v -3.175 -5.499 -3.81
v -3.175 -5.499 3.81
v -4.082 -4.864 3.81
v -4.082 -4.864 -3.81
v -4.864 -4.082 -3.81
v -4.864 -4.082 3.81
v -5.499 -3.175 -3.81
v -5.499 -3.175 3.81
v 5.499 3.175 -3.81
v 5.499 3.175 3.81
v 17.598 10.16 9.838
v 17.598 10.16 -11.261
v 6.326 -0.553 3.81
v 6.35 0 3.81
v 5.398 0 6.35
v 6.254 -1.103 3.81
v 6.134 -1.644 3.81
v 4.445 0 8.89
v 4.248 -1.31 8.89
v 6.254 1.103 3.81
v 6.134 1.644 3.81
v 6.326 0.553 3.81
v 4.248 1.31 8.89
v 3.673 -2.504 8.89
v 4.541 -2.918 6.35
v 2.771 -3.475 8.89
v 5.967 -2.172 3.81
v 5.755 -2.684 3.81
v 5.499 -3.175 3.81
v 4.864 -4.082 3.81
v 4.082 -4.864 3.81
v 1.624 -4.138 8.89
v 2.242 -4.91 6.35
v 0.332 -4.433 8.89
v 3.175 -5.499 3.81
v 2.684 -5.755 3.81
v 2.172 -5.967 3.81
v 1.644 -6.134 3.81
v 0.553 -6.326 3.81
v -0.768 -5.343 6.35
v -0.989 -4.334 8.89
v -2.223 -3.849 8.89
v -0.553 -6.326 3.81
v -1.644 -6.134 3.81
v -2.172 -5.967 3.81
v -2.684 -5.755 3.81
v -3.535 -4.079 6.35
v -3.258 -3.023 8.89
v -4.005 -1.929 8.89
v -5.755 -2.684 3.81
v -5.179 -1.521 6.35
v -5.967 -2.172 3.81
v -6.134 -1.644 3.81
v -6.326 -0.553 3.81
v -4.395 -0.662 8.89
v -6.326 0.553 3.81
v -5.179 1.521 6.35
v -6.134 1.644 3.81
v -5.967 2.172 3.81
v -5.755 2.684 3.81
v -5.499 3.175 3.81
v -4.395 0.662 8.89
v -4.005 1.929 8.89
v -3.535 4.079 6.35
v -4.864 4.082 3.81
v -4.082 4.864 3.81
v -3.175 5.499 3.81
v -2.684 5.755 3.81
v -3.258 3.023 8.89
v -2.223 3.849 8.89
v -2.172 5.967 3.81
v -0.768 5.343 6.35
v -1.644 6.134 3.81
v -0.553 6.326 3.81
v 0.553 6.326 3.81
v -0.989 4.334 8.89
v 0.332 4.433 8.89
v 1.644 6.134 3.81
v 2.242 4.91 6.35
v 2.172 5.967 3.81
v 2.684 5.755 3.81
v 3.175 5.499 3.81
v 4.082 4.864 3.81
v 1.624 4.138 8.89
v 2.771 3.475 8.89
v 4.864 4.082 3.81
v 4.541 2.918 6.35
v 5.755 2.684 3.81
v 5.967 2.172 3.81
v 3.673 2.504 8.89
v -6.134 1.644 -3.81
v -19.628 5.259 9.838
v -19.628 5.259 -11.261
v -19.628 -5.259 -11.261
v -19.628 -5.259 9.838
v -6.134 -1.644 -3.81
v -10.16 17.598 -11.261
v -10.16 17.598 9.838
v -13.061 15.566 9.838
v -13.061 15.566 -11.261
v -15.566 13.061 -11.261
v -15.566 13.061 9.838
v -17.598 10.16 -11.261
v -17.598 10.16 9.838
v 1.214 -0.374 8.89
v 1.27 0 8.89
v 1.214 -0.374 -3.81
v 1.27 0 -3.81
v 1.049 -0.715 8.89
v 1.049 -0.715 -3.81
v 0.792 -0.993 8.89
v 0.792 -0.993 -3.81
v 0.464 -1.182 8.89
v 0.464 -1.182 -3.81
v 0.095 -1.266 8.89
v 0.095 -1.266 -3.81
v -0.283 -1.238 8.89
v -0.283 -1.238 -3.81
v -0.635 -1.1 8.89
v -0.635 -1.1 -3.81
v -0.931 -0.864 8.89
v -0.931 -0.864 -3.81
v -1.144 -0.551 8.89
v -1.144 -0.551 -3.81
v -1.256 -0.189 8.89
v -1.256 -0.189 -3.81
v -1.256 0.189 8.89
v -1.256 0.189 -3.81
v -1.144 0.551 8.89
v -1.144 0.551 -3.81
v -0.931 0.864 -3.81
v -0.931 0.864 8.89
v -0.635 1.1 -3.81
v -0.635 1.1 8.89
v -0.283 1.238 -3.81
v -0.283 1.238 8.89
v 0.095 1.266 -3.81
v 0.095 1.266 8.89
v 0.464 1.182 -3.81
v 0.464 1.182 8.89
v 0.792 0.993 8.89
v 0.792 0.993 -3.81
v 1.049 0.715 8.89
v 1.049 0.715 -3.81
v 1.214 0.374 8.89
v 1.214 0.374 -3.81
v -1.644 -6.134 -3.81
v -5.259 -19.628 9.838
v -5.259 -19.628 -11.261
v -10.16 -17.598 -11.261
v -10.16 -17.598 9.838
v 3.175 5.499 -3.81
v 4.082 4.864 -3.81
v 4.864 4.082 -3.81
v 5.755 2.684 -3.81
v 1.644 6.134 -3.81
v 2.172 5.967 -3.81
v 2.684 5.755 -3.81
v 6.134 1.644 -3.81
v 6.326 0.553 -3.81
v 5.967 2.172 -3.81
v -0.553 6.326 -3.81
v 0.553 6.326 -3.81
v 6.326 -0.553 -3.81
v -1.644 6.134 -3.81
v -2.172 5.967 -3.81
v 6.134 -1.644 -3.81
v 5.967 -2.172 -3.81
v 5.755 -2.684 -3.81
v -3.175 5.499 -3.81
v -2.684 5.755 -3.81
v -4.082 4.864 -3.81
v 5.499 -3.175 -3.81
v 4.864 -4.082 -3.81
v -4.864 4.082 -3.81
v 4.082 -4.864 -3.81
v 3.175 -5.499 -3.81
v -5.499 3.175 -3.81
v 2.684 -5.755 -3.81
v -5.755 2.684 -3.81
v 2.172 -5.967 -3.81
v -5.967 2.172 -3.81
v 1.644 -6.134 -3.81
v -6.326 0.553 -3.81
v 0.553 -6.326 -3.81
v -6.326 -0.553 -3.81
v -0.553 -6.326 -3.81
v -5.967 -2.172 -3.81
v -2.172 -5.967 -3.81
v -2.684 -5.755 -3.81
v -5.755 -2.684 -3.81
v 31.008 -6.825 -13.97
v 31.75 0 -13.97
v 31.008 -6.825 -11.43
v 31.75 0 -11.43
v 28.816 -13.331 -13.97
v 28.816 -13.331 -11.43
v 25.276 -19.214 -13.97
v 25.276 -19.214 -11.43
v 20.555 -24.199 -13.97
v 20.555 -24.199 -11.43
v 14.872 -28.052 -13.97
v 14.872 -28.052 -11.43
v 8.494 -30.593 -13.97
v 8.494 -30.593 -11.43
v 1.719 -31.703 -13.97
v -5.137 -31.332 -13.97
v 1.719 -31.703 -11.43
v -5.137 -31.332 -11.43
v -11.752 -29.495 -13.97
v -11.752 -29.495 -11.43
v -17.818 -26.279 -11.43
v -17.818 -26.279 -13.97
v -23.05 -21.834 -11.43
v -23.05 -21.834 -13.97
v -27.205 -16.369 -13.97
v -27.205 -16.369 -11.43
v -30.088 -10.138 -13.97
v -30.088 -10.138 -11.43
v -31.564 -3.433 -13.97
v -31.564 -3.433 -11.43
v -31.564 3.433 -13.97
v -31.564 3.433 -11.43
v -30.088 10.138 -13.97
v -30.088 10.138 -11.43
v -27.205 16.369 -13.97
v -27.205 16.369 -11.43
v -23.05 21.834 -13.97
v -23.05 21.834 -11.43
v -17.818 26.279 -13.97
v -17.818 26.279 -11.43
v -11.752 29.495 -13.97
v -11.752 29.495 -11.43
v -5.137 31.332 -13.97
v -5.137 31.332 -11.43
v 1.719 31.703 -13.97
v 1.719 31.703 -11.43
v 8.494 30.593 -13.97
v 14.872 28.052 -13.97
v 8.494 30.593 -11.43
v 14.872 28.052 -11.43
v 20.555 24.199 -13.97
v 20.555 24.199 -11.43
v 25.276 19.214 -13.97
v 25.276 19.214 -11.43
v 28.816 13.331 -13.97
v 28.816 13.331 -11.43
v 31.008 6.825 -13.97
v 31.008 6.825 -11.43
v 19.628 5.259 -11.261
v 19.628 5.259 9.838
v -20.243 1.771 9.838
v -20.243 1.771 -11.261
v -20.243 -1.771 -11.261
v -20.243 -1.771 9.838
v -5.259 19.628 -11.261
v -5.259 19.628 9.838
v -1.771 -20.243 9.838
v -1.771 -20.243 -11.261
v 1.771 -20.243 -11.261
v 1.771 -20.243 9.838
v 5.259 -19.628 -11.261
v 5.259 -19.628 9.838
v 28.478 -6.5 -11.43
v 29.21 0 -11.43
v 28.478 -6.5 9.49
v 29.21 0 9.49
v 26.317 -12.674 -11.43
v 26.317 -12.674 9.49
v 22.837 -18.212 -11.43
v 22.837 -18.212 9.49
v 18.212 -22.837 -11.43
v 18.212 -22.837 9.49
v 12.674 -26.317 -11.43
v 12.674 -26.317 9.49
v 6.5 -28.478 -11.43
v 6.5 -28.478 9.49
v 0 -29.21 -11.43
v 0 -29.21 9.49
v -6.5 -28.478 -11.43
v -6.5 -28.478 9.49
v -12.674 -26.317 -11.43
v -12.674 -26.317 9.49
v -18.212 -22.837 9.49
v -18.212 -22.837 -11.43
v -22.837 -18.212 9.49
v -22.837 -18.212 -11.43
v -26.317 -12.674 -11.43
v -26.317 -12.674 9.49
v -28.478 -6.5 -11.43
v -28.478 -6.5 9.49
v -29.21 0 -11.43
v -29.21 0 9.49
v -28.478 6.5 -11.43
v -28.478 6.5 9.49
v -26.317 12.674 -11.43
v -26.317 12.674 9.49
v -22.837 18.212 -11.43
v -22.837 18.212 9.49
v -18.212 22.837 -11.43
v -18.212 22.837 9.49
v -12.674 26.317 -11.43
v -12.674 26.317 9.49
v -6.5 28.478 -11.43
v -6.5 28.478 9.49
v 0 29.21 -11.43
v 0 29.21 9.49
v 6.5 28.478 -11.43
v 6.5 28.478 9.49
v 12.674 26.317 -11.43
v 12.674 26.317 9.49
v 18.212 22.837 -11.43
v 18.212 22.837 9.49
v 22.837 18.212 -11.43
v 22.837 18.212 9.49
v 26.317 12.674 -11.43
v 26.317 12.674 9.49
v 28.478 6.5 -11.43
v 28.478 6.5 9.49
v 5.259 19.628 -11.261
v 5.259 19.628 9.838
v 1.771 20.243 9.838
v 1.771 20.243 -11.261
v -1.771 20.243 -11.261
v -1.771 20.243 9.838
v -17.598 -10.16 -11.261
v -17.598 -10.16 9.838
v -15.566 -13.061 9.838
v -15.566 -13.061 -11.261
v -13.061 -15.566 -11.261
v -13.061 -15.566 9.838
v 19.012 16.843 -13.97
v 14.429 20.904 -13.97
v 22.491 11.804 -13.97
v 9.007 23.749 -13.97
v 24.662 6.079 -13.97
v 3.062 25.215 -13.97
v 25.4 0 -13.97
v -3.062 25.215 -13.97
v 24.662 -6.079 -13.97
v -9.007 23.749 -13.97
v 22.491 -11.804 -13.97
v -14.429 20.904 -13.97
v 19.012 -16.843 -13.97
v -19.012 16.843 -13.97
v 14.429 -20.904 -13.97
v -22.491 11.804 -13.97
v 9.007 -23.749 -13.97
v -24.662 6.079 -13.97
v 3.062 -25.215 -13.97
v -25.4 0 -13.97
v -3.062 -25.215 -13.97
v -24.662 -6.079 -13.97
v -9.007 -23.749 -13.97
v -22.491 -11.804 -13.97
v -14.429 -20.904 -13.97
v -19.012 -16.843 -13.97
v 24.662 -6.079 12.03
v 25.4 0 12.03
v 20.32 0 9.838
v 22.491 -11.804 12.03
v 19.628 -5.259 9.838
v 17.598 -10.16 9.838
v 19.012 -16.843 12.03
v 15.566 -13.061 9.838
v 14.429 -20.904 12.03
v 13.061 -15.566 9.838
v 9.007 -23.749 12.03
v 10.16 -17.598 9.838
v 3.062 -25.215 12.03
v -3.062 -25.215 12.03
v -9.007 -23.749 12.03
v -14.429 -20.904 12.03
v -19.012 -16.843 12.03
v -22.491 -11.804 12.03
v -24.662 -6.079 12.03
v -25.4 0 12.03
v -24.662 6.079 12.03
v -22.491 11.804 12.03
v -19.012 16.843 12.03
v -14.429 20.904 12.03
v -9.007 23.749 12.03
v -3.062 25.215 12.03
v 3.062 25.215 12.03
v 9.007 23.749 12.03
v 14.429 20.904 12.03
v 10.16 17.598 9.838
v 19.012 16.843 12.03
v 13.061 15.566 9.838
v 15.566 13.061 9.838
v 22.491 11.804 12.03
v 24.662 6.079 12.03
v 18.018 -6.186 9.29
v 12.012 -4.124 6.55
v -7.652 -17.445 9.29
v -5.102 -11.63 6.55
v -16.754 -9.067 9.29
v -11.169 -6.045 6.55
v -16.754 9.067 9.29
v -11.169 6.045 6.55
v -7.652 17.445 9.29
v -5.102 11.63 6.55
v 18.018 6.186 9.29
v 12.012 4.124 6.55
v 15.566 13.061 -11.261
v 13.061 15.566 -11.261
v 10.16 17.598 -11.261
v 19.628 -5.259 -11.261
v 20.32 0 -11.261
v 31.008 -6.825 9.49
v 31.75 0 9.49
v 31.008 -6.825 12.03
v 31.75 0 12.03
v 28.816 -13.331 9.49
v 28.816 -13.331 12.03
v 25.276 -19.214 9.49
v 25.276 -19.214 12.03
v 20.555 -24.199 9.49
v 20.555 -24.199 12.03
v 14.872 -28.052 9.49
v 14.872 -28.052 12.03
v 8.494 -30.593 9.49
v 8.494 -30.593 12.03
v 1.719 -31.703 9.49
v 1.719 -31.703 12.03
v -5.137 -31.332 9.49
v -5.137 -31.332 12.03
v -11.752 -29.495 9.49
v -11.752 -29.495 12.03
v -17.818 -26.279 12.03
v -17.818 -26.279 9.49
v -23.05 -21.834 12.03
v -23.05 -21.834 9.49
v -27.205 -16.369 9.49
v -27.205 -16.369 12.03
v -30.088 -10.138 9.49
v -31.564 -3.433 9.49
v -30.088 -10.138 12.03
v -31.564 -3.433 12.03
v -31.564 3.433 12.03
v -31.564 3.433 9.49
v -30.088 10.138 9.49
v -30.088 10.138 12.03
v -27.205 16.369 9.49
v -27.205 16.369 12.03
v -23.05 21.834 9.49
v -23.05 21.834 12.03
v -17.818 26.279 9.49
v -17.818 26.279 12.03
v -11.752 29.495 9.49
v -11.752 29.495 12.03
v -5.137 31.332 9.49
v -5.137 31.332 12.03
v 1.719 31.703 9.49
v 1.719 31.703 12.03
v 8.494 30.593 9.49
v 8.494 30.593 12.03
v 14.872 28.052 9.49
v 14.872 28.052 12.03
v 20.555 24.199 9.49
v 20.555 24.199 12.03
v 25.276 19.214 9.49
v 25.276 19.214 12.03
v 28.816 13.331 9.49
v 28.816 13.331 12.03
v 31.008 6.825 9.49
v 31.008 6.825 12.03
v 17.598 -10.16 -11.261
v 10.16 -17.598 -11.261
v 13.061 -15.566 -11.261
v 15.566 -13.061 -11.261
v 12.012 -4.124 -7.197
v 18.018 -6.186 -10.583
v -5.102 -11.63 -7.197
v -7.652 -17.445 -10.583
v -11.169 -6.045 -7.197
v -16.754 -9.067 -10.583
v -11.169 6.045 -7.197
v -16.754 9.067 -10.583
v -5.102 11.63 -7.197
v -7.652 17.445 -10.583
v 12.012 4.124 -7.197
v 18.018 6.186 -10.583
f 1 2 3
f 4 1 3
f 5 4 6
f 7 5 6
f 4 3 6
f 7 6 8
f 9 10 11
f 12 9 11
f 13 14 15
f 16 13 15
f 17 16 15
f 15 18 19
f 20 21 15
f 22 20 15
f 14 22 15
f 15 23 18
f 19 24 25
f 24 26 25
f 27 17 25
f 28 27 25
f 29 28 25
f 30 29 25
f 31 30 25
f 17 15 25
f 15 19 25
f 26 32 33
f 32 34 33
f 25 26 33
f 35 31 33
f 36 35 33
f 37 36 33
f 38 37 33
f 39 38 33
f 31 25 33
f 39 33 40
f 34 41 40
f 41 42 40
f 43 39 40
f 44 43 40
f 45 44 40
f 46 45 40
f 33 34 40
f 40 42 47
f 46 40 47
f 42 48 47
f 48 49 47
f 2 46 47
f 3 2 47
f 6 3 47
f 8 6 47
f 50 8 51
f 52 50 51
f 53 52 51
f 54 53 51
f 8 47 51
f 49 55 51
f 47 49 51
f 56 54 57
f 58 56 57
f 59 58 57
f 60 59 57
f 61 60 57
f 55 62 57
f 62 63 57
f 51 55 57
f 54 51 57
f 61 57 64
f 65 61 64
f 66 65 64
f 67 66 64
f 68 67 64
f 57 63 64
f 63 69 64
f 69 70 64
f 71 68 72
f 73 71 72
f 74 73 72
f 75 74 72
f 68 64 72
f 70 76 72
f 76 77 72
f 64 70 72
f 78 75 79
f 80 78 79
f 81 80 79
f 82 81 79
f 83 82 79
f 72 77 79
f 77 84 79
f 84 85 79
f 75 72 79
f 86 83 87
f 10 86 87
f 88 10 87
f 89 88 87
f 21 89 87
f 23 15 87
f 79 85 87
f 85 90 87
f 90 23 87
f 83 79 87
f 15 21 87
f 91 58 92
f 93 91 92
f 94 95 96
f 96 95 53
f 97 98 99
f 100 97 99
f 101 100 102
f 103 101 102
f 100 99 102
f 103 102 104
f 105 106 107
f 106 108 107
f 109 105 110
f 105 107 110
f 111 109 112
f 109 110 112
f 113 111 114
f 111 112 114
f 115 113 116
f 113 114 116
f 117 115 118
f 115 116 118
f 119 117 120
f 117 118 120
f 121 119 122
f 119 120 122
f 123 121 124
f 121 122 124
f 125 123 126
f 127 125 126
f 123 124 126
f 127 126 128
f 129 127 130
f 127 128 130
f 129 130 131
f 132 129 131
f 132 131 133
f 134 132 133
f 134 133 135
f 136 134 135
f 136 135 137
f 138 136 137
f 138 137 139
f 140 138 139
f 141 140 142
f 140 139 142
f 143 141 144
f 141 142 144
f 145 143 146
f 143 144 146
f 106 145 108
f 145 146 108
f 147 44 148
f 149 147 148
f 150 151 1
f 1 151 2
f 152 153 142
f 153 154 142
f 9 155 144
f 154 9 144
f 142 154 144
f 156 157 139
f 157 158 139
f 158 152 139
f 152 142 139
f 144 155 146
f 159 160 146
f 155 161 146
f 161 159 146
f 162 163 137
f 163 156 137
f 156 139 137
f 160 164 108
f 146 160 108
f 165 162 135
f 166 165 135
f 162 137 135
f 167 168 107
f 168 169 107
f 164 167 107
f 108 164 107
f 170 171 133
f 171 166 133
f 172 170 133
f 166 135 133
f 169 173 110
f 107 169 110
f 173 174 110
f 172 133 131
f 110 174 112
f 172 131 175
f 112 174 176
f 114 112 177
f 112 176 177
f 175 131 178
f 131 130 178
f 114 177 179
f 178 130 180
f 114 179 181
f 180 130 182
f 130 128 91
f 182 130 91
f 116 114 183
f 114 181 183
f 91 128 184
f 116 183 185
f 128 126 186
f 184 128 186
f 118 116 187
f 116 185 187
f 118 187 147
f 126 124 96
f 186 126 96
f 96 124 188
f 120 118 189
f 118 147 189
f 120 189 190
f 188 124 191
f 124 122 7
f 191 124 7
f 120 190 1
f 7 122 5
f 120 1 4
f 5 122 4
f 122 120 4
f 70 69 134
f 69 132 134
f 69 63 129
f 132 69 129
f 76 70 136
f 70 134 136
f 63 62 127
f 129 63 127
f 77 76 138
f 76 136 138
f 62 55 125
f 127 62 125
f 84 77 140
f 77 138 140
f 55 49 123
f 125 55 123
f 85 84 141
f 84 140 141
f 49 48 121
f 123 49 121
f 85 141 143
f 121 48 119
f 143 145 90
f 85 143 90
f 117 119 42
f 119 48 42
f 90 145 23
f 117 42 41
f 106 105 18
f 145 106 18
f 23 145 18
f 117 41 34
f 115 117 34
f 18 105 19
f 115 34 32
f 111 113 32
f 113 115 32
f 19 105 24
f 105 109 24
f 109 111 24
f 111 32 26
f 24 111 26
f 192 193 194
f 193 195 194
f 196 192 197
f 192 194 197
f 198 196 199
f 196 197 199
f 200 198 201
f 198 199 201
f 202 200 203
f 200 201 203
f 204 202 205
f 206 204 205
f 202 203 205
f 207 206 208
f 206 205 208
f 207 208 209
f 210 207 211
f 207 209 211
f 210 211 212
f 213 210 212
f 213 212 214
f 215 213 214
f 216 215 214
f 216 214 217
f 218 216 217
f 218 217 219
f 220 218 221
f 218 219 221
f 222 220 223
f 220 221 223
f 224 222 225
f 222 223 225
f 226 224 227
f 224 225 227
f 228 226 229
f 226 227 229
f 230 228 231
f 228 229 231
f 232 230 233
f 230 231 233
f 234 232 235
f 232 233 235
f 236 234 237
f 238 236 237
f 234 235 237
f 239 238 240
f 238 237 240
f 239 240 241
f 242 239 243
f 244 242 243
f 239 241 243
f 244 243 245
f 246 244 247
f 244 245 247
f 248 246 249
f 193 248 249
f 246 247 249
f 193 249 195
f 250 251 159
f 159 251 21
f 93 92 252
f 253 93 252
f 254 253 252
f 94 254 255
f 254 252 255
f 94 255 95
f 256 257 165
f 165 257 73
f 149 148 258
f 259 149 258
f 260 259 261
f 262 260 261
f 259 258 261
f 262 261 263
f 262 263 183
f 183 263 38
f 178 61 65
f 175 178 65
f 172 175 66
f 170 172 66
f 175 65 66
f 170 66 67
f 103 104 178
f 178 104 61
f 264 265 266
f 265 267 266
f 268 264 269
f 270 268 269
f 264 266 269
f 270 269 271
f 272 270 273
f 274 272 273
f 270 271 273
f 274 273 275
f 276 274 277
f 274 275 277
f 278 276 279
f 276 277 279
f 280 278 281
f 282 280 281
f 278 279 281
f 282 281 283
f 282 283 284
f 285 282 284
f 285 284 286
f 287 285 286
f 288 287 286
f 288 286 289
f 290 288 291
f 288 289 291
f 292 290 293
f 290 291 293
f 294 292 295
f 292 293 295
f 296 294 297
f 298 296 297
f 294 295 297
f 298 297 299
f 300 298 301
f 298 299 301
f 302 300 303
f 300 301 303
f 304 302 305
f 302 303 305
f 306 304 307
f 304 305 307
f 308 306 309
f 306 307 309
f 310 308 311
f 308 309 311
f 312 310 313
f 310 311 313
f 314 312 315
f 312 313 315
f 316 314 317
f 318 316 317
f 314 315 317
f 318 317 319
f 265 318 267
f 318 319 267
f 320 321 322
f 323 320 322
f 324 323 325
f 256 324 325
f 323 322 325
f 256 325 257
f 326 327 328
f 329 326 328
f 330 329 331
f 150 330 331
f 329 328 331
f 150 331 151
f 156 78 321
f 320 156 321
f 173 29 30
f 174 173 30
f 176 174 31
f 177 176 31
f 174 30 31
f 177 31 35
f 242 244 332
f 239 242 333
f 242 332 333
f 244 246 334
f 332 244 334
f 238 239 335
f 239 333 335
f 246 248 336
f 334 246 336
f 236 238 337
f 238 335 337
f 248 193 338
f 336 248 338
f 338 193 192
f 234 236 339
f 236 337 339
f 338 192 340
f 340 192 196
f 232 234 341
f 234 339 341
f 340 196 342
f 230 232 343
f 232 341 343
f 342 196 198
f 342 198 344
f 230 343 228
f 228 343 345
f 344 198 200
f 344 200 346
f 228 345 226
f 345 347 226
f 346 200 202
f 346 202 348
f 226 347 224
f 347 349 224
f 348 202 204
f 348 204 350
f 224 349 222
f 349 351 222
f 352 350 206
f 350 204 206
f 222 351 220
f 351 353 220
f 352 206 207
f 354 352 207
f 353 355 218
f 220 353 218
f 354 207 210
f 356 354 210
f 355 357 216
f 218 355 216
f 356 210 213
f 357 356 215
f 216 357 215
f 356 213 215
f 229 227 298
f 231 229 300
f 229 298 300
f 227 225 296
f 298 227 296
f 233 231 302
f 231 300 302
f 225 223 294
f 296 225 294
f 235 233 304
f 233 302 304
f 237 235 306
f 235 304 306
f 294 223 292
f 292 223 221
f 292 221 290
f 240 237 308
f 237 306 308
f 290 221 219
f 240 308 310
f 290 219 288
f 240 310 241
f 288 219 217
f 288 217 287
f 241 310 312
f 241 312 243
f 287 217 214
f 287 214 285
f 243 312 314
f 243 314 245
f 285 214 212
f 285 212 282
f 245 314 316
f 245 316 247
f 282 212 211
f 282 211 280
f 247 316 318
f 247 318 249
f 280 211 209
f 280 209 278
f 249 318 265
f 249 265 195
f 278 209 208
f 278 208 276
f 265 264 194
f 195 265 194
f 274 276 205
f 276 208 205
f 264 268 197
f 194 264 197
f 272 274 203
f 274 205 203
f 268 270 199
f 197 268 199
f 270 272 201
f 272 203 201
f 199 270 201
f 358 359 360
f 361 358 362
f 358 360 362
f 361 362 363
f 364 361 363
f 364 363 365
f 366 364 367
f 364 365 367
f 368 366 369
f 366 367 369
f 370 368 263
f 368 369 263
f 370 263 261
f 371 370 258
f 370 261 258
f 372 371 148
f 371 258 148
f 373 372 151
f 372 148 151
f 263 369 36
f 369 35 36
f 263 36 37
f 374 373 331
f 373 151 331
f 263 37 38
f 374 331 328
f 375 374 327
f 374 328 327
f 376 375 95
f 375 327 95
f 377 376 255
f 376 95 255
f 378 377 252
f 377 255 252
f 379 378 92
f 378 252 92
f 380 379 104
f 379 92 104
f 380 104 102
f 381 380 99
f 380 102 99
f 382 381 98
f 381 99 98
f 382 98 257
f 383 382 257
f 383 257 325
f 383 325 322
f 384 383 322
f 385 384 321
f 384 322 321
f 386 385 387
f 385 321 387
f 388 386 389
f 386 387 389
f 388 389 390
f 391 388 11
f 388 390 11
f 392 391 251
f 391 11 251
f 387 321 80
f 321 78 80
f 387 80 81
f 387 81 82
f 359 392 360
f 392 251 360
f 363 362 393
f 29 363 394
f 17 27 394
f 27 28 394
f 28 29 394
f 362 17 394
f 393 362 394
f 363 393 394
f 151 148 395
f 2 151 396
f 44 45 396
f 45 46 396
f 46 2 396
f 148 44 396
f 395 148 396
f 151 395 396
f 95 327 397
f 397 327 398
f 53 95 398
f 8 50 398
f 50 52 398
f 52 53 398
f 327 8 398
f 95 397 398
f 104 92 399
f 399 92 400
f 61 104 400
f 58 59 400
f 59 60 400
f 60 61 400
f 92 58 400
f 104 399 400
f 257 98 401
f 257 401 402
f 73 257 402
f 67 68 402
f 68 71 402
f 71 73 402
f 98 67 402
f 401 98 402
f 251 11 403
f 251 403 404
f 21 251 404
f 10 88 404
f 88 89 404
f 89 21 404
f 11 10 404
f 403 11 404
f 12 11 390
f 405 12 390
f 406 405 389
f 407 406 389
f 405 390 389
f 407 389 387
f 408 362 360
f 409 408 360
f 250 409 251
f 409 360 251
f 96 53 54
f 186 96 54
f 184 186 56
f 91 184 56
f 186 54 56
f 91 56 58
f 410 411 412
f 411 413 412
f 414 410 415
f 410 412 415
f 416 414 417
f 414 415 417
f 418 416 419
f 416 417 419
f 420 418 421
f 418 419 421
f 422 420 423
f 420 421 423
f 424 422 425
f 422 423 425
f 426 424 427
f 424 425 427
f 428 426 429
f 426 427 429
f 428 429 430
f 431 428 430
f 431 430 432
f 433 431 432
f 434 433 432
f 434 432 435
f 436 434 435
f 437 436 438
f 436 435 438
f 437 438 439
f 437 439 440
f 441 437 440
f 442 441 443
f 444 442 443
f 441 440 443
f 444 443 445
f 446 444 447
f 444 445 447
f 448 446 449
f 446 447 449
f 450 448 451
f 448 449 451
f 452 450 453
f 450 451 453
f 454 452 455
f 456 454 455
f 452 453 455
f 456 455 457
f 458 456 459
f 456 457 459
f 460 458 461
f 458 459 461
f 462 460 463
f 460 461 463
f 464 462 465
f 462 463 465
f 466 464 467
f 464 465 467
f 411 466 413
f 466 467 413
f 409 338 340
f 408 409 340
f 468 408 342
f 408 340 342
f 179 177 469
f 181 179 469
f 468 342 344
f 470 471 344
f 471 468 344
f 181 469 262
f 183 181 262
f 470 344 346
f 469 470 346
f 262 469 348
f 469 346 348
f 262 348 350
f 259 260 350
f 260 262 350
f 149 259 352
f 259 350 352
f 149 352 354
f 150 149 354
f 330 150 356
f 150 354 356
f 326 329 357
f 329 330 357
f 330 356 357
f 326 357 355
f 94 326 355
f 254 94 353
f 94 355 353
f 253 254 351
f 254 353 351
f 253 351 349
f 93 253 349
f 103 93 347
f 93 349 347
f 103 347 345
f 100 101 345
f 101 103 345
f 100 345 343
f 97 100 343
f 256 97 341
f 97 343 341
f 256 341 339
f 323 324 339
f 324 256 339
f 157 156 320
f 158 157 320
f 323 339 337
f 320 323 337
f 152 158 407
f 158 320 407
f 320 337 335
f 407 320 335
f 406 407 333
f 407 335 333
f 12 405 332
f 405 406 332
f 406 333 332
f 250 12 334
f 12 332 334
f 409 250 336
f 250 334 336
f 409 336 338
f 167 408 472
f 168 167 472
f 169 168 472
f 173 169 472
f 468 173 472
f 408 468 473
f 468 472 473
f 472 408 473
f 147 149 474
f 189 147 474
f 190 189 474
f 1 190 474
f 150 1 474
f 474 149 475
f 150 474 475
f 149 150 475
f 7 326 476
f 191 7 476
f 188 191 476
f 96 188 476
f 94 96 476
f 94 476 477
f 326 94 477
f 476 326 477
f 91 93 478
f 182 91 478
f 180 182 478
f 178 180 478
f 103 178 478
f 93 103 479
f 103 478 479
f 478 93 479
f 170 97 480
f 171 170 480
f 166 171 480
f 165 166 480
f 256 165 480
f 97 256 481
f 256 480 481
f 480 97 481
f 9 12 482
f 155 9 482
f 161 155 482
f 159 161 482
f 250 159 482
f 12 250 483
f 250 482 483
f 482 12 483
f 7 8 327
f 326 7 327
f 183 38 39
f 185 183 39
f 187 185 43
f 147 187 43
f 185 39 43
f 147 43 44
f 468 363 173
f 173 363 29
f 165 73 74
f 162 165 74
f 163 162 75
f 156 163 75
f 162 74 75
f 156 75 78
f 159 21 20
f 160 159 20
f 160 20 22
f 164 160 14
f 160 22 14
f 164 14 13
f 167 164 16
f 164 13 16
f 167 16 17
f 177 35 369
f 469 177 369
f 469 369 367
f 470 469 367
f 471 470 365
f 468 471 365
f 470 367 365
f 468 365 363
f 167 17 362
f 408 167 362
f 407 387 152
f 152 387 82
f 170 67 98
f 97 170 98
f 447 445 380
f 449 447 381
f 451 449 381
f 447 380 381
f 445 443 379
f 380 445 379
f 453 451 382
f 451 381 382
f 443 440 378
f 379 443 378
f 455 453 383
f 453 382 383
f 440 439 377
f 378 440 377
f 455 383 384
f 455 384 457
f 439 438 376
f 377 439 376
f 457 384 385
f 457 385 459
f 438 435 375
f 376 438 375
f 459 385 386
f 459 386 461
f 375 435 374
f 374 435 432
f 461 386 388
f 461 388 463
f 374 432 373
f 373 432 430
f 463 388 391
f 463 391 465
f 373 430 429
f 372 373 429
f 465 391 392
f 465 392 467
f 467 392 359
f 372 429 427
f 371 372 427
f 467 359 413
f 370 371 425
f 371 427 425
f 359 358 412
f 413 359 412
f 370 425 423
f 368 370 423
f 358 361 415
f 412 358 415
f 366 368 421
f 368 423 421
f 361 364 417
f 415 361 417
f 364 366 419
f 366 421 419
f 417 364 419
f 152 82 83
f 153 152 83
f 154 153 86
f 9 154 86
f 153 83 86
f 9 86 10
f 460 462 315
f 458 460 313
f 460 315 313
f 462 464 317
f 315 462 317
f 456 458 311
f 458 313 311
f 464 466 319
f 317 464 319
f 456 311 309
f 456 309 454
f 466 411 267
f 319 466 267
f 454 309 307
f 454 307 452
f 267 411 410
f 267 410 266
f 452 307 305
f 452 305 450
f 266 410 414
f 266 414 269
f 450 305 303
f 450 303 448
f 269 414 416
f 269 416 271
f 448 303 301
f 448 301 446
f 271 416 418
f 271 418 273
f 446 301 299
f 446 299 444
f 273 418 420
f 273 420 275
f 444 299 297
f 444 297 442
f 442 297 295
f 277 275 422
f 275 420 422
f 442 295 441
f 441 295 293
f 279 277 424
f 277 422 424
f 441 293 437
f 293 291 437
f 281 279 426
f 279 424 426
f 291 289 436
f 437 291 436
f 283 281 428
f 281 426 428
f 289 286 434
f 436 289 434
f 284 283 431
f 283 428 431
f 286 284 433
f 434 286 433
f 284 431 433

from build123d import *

# Parameters (mm, degrees)
CUT_EXTRUDE1_REACH = 53.886
CIRPATTERN1_COUNT  = 8


with BuildPart() as part:
    # Sketch1 → Revolve1 (revolve)
    with BuildSketch(Plane(origin=(0, 0, 0), x_dir=(0, 0, -1), z_dir=(1, 0, 0)), mode=Mode.PRIVATE) as revolve1_sk:
        Polygon((-8.89, 1.27), (3.81, 1.27), (3.81, 6.35), (13.97, 25.4), (13.97, 31.75), (11.43, 31.75), (11.43, 29.21), (-9.49, 29.21), (-9.49, 31.75), (-12.03, 31.75), (-12.03, 25.4), (-3.81, 6.35), (-8.89, 4.445), align=None)
    revolve(revolve1_sk.sketch.rotate(Axis((0, 0, 0), (0, 0, -1)), 90), axis=Axis((0, 0, 0), (0, 0, -1)))

    # Cut-Extrude1: up to this cone (the profile starts outside it)
    cut_extrude1_end = Plane(origin=(0, 0, 12.03), z_dir=(0, 0, -1)).offset(12.453334333) * Cone(1.875e-06, 78.62375, 41.932665667, align=(Align.CENTER, Align.CENTER, Align.MIN), mode=Mode.PRIVATE)
    # Sketch2 → Cut-Extrude1 (cut, up to the surface)
    with BuildSketch(Plane.XY.offset(12.03), mode=Mode.PRIVATE) as cut_extrude1_sk1:
        with BuildLine():
            Line((-5.259202996, 19.62761279), (-1.643500936, 6.133628997))
            ThreePointArc((-1.643500936, 6.133628997), (0, 6.35), (1.643500936, 6.133628997))
            Line((1.643500936, 6.133628997), (5.259202996, 19.62761279))
            ThreePointArc((5.259202996, 19.62761279), (0, 20.32), (-5.259202996, 19.62761279))
        make_face()
    cut_extrude1_tool1 = extrude(cut_extrude1_sk1.sketch, amount=-CUT_EXTRUDE1_REACH, mode=Mode.PRIVATE) - cut_extrude1_end
    cut_extrude1 = cut_extrude1_tool1.solids().sort_by_distance((0, 14.388913, 12.03))[0]
    add(cut_extrude1, mode=Mode.SUBTRACT)

    # CirPattern1: Cut-Extrude1 ×8 about axis
    cirpattern1_axis = Axis((0, 0, 0), (0, 0, 1))
    for i in range(1, CIRPATTERN1_COUNT):
        add(cut_extrude1.rotate(cirpattern1_axis, i * 360 / CIRPATTERN1_COUNT), mode=Mode.SUBTRACT)


solid = part.part
